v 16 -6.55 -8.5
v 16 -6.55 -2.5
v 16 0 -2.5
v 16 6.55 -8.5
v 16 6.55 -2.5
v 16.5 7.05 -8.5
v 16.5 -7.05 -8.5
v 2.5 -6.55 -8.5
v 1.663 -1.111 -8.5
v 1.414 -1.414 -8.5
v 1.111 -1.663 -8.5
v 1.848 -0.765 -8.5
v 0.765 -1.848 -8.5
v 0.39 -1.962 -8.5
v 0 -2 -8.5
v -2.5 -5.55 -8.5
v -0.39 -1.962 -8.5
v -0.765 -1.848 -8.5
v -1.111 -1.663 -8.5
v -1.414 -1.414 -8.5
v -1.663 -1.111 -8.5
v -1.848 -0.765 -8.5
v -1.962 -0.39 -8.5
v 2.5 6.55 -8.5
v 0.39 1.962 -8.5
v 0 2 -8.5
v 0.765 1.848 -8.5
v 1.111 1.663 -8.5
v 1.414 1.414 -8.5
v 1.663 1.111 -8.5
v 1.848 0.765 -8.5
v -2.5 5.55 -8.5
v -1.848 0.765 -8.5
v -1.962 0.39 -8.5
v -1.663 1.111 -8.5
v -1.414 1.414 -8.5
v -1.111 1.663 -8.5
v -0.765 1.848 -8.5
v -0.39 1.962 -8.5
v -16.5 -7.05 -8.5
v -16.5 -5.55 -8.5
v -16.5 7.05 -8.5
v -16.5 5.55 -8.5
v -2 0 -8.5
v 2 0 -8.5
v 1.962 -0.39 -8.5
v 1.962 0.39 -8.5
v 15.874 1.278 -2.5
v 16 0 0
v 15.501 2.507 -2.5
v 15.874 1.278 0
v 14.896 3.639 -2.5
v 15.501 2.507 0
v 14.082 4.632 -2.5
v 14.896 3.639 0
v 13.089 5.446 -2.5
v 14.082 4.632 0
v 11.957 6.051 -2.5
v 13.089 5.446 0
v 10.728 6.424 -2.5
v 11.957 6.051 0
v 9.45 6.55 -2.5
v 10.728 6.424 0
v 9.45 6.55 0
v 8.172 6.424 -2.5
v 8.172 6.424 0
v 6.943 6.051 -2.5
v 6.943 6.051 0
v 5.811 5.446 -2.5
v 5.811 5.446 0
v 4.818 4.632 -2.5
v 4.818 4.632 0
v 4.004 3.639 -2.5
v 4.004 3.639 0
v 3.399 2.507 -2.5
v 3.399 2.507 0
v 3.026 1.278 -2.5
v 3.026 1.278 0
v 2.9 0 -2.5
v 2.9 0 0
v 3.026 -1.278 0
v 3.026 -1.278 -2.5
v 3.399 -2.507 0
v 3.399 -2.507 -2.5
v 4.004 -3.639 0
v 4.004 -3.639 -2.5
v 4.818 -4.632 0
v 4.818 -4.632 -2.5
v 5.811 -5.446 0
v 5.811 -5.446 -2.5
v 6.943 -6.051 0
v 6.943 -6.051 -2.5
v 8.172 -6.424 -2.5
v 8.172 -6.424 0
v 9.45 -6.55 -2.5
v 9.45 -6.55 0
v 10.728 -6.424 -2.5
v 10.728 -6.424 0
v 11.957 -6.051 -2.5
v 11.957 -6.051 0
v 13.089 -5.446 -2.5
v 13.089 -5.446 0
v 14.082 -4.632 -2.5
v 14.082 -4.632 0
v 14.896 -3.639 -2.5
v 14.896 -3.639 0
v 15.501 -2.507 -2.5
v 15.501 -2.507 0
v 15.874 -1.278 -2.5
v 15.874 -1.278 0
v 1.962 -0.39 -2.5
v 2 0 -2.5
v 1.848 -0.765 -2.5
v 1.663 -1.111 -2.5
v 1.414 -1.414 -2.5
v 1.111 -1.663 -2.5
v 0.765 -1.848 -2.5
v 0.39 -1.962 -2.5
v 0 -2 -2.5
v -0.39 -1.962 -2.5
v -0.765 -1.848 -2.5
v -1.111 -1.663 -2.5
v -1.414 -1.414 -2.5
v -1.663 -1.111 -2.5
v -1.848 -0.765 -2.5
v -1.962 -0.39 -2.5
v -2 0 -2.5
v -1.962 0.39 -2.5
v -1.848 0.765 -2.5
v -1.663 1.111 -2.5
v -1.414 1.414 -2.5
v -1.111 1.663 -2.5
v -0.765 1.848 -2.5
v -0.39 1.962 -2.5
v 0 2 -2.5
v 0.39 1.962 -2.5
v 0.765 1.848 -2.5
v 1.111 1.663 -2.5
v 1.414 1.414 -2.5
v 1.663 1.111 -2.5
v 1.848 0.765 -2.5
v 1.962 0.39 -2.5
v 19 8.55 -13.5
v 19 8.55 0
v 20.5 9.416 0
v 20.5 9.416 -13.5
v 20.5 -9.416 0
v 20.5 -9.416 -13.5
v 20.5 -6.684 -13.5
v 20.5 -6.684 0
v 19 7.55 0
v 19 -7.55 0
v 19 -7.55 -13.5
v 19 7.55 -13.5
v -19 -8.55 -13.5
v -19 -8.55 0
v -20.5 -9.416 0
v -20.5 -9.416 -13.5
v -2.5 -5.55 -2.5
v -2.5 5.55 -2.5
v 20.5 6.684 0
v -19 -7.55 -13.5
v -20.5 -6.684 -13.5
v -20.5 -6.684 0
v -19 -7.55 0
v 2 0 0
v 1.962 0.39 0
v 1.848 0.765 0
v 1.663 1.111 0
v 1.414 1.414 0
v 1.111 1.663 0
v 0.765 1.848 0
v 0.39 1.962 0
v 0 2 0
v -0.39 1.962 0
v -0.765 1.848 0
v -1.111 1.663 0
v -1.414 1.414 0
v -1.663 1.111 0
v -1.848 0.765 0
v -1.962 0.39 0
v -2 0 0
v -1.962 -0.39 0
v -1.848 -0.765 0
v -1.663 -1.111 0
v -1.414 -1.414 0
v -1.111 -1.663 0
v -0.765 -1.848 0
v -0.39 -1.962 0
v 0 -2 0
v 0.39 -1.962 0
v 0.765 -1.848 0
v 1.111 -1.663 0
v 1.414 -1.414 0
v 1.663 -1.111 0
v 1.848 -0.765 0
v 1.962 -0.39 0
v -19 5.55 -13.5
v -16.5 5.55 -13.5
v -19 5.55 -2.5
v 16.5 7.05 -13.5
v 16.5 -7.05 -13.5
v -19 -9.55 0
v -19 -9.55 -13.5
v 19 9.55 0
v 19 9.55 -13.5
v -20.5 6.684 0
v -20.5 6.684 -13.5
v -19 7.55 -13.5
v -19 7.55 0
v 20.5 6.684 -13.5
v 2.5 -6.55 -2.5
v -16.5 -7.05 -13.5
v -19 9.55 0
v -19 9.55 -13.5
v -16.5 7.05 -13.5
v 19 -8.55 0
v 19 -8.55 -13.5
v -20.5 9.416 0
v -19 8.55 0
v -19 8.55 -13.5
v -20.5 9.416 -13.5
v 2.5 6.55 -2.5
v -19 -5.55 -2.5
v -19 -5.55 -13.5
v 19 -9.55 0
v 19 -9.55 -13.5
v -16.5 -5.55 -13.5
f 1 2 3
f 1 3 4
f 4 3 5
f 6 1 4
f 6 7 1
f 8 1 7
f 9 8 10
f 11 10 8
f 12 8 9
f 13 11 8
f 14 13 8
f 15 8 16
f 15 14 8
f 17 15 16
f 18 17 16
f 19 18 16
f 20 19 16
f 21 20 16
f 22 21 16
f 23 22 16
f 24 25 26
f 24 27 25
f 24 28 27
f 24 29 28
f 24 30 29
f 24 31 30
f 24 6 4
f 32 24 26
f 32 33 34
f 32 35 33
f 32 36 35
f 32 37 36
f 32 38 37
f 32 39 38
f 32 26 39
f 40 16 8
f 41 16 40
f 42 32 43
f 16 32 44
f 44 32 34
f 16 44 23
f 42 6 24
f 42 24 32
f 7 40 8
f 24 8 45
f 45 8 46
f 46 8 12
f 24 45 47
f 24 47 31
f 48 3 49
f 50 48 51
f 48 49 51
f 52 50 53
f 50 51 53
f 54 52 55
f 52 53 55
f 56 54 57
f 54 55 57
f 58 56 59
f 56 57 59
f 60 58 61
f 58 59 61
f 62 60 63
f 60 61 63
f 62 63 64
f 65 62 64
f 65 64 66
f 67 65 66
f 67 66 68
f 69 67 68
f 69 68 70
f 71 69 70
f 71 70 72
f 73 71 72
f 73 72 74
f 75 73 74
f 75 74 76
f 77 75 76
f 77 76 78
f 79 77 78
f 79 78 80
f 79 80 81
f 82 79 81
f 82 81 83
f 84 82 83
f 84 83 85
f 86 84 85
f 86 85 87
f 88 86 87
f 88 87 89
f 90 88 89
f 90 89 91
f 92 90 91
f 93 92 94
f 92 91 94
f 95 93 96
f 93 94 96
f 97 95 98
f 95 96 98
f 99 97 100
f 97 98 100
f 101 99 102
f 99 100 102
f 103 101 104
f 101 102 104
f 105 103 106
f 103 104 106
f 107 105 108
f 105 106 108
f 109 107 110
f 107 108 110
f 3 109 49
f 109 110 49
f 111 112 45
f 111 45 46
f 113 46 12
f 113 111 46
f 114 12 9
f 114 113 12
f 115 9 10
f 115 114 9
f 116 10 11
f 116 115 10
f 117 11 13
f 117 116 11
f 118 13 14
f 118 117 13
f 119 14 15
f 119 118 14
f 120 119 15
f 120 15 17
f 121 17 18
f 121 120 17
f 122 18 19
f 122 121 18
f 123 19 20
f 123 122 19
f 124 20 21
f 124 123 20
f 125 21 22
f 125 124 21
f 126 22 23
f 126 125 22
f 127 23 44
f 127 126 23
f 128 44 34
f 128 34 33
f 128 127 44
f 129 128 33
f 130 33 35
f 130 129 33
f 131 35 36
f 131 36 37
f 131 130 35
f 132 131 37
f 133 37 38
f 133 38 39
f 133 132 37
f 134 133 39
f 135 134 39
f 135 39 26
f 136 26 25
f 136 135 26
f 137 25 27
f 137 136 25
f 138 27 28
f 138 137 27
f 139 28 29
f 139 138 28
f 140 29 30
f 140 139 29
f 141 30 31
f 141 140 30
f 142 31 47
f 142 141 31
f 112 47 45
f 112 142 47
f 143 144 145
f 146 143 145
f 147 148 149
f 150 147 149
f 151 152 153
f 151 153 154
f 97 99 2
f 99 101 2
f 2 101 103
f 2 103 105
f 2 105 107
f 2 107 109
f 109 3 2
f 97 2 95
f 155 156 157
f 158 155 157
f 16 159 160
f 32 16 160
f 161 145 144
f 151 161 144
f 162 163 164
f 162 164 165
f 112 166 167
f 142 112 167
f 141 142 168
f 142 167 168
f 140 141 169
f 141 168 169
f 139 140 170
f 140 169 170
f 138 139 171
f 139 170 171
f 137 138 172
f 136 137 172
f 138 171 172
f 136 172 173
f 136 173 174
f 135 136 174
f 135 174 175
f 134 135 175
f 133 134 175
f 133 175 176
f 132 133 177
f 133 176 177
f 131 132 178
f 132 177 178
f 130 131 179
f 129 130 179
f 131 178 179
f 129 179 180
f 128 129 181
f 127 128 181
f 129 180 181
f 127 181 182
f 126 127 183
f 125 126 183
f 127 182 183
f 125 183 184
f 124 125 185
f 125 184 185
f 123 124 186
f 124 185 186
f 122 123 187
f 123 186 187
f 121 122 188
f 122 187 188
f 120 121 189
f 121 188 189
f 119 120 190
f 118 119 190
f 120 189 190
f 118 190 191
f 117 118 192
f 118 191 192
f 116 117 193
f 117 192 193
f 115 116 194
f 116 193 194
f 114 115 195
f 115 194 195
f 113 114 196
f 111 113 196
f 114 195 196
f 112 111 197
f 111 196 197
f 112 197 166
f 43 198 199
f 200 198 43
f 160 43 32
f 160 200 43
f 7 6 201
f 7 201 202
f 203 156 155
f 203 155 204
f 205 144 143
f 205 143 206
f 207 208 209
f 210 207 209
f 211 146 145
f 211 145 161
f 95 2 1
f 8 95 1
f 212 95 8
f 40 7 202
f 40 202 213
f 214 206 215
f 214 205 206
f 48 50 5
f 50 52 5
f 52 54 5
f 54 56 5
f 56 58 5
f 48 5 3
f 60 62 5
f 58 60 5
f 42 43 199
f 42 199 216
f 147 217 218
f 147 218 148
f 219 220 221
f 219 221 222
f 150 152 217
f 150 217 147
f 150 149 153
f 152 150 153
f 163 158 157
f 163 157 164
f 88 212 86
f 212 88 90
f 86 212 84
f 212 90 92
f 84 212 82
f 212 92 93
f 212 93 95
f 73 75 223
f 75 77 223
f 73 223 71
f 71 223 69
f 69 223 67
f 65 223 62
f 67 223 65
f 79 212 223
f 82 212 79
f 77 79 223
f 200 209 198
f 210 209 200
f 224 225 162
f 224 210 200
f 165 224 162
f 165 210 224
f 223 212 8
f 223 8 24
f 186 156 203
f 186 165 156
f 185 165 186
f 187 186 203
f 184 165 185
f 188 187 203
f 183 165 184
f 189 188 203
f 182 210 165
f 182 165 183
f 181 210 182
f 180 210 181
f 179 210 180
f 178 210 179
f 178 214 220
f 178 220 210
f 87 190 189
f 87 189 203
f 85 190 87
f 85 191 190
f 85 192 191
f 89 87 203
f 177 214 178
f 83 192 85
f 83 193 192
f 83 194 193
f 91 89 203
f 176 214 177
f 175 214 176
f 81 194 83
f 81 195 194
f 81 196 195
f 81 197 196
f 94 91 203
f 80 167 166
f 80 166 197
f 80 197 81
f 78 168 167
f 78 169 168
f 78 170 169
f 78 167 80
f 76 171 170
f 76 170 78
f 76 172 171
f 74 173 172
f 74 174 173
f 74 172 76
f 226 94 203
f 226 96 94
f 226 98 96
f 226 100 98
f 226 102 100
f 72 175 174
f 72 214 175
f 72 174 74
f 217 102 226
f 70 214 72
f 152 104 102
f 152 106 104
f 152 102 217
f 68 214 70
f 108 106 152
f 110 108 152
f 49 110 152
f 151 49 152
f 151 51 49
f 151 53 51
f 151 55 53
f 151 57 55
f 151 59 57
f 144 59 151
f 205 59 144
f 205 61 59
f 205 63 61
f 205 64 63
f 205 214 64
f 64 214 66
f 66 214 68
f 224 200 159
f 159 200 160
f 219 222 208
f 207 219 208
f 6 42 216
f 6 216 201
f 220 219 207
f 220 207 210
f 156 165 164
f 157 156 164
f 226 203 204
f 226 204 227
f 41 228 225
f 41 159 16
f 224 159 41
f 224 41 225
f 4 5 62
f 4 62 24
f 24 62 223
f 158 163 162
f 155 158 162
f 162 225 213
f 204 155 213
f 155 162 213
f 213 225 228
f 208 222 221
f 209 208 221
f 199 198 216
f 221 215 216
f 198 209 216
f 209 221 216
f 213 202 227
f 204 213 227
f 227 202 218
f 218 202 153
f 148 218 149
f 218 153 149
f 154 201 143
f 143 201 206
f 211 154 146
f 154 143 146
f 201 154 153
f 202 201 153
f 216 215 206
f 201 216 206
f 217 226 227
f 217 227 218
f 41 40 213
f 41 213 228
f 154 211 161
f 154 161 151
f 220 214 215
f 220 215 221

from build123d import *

# Parameters (mm, degrees)
SKETCH2_W           = 38
SKETCH2_H           = 19.1
SKETCH2_R           = 6.55
SKETCH2_R_2         = 2
BOSS_EXTRUDE1_DEPTH = 2.5
SKETCH3_R           = 2
SKETCH3_W           = 13.5
SKETCH3_H           = 13.1
BOSS_EXTRUDE2_DEPTH = 6
BOSS_EXTRUDE3_DEPTH = 5
BOSS_EXTRUDE4_DEPTH = 13.5


with BuildPart() as part:
    # Sketch2 → Boss-Extrude1 (new body)
    with BuildSketch(Plane.XY):
        Rectangle(SKETCH2_W, SKETCH2_H)
        with Locations((9.45, 0)):
            Circle(SKETCH2_R, mode=Mode.SUBTRACT)
        Circle(SKETCH2_R_2, mode=Mode.SUBTRACT)
    extrude(amount=-BOSS_EXTRUDE1_DEPTH)

    # Sketch3 → Boss-Extrude2 (add)
    with BuildSketch(Plane(origin=(0, 0, -2.5), x_dir=(-1, 0, 0), z_dir=(0, 0, -1))):
        Polygon((-19, -9.55), (19, -9.55), (19, -5.55), (2.5, -5.55), (2.5, 5.55), (19, 5.55), (19, 9.55), (-19, 9.55), align=None)
        with Locations(Location((0, 0, 0), (0, 0, 180))):
            Circle(SKETCH3_R, mode=Mode.SUBTRACT)
        with Locations((-9.25, 0)):
            Rectangle(SKETCH3_W, SKETCH3_H, mode=Mode.SUBTRACT)
    extrude(amount=BOSS_EXTRUDE2_DEPTH)

    # Sketch4 → Boss-Extrude3 (add)
    with BuildSketch(Plane(origin=(0, 0, -8.5), x_dir=(-1, 0, 0), z_dir=(0, 0, -1))):
        Polygon((19, 5.55), (16.5, 5.55), (16.5, 7.05), (-16.5, 7.05), (-16.5, -7.05), (16.5, -7.05), (16.5, -5.55), (19, -5.55), (19, -9.55), (-19, -9.55), (-19, 9.55), (19, 9.55), align=None)
    extrude(amount=BOSS_EXTRUDE3_DEPTH)

    # Sketch5 → Boss-Extrude4 (add)
    with BuildSketch(Plane(origin=(0, 0, -13.5), x_dir=(-1, 0, 0), z_dir=(0, 0, -1))):
        Polygon((-19, 8.55), (-20.5, 9.416025404), (-20.5, 6.683974596), (-19, 7.55), align=None)
        Polygon((-19, -7.55), (-19, -8.55), (-20.5, -9.416025404), (-20.5, -6.683974596), align=None)
    boss_extrude4 = extrude(amount=-BOSS_EXTRUDE4_DEPTH)

    # Mirror1: Boss-Extrude4 across plane
    add(boss_extrude4.mirror(Plane(origin=(0, 0, 0), x_dir=(0, 0, 1), z_dir=(1, 0, 0))))


solid = part.part
